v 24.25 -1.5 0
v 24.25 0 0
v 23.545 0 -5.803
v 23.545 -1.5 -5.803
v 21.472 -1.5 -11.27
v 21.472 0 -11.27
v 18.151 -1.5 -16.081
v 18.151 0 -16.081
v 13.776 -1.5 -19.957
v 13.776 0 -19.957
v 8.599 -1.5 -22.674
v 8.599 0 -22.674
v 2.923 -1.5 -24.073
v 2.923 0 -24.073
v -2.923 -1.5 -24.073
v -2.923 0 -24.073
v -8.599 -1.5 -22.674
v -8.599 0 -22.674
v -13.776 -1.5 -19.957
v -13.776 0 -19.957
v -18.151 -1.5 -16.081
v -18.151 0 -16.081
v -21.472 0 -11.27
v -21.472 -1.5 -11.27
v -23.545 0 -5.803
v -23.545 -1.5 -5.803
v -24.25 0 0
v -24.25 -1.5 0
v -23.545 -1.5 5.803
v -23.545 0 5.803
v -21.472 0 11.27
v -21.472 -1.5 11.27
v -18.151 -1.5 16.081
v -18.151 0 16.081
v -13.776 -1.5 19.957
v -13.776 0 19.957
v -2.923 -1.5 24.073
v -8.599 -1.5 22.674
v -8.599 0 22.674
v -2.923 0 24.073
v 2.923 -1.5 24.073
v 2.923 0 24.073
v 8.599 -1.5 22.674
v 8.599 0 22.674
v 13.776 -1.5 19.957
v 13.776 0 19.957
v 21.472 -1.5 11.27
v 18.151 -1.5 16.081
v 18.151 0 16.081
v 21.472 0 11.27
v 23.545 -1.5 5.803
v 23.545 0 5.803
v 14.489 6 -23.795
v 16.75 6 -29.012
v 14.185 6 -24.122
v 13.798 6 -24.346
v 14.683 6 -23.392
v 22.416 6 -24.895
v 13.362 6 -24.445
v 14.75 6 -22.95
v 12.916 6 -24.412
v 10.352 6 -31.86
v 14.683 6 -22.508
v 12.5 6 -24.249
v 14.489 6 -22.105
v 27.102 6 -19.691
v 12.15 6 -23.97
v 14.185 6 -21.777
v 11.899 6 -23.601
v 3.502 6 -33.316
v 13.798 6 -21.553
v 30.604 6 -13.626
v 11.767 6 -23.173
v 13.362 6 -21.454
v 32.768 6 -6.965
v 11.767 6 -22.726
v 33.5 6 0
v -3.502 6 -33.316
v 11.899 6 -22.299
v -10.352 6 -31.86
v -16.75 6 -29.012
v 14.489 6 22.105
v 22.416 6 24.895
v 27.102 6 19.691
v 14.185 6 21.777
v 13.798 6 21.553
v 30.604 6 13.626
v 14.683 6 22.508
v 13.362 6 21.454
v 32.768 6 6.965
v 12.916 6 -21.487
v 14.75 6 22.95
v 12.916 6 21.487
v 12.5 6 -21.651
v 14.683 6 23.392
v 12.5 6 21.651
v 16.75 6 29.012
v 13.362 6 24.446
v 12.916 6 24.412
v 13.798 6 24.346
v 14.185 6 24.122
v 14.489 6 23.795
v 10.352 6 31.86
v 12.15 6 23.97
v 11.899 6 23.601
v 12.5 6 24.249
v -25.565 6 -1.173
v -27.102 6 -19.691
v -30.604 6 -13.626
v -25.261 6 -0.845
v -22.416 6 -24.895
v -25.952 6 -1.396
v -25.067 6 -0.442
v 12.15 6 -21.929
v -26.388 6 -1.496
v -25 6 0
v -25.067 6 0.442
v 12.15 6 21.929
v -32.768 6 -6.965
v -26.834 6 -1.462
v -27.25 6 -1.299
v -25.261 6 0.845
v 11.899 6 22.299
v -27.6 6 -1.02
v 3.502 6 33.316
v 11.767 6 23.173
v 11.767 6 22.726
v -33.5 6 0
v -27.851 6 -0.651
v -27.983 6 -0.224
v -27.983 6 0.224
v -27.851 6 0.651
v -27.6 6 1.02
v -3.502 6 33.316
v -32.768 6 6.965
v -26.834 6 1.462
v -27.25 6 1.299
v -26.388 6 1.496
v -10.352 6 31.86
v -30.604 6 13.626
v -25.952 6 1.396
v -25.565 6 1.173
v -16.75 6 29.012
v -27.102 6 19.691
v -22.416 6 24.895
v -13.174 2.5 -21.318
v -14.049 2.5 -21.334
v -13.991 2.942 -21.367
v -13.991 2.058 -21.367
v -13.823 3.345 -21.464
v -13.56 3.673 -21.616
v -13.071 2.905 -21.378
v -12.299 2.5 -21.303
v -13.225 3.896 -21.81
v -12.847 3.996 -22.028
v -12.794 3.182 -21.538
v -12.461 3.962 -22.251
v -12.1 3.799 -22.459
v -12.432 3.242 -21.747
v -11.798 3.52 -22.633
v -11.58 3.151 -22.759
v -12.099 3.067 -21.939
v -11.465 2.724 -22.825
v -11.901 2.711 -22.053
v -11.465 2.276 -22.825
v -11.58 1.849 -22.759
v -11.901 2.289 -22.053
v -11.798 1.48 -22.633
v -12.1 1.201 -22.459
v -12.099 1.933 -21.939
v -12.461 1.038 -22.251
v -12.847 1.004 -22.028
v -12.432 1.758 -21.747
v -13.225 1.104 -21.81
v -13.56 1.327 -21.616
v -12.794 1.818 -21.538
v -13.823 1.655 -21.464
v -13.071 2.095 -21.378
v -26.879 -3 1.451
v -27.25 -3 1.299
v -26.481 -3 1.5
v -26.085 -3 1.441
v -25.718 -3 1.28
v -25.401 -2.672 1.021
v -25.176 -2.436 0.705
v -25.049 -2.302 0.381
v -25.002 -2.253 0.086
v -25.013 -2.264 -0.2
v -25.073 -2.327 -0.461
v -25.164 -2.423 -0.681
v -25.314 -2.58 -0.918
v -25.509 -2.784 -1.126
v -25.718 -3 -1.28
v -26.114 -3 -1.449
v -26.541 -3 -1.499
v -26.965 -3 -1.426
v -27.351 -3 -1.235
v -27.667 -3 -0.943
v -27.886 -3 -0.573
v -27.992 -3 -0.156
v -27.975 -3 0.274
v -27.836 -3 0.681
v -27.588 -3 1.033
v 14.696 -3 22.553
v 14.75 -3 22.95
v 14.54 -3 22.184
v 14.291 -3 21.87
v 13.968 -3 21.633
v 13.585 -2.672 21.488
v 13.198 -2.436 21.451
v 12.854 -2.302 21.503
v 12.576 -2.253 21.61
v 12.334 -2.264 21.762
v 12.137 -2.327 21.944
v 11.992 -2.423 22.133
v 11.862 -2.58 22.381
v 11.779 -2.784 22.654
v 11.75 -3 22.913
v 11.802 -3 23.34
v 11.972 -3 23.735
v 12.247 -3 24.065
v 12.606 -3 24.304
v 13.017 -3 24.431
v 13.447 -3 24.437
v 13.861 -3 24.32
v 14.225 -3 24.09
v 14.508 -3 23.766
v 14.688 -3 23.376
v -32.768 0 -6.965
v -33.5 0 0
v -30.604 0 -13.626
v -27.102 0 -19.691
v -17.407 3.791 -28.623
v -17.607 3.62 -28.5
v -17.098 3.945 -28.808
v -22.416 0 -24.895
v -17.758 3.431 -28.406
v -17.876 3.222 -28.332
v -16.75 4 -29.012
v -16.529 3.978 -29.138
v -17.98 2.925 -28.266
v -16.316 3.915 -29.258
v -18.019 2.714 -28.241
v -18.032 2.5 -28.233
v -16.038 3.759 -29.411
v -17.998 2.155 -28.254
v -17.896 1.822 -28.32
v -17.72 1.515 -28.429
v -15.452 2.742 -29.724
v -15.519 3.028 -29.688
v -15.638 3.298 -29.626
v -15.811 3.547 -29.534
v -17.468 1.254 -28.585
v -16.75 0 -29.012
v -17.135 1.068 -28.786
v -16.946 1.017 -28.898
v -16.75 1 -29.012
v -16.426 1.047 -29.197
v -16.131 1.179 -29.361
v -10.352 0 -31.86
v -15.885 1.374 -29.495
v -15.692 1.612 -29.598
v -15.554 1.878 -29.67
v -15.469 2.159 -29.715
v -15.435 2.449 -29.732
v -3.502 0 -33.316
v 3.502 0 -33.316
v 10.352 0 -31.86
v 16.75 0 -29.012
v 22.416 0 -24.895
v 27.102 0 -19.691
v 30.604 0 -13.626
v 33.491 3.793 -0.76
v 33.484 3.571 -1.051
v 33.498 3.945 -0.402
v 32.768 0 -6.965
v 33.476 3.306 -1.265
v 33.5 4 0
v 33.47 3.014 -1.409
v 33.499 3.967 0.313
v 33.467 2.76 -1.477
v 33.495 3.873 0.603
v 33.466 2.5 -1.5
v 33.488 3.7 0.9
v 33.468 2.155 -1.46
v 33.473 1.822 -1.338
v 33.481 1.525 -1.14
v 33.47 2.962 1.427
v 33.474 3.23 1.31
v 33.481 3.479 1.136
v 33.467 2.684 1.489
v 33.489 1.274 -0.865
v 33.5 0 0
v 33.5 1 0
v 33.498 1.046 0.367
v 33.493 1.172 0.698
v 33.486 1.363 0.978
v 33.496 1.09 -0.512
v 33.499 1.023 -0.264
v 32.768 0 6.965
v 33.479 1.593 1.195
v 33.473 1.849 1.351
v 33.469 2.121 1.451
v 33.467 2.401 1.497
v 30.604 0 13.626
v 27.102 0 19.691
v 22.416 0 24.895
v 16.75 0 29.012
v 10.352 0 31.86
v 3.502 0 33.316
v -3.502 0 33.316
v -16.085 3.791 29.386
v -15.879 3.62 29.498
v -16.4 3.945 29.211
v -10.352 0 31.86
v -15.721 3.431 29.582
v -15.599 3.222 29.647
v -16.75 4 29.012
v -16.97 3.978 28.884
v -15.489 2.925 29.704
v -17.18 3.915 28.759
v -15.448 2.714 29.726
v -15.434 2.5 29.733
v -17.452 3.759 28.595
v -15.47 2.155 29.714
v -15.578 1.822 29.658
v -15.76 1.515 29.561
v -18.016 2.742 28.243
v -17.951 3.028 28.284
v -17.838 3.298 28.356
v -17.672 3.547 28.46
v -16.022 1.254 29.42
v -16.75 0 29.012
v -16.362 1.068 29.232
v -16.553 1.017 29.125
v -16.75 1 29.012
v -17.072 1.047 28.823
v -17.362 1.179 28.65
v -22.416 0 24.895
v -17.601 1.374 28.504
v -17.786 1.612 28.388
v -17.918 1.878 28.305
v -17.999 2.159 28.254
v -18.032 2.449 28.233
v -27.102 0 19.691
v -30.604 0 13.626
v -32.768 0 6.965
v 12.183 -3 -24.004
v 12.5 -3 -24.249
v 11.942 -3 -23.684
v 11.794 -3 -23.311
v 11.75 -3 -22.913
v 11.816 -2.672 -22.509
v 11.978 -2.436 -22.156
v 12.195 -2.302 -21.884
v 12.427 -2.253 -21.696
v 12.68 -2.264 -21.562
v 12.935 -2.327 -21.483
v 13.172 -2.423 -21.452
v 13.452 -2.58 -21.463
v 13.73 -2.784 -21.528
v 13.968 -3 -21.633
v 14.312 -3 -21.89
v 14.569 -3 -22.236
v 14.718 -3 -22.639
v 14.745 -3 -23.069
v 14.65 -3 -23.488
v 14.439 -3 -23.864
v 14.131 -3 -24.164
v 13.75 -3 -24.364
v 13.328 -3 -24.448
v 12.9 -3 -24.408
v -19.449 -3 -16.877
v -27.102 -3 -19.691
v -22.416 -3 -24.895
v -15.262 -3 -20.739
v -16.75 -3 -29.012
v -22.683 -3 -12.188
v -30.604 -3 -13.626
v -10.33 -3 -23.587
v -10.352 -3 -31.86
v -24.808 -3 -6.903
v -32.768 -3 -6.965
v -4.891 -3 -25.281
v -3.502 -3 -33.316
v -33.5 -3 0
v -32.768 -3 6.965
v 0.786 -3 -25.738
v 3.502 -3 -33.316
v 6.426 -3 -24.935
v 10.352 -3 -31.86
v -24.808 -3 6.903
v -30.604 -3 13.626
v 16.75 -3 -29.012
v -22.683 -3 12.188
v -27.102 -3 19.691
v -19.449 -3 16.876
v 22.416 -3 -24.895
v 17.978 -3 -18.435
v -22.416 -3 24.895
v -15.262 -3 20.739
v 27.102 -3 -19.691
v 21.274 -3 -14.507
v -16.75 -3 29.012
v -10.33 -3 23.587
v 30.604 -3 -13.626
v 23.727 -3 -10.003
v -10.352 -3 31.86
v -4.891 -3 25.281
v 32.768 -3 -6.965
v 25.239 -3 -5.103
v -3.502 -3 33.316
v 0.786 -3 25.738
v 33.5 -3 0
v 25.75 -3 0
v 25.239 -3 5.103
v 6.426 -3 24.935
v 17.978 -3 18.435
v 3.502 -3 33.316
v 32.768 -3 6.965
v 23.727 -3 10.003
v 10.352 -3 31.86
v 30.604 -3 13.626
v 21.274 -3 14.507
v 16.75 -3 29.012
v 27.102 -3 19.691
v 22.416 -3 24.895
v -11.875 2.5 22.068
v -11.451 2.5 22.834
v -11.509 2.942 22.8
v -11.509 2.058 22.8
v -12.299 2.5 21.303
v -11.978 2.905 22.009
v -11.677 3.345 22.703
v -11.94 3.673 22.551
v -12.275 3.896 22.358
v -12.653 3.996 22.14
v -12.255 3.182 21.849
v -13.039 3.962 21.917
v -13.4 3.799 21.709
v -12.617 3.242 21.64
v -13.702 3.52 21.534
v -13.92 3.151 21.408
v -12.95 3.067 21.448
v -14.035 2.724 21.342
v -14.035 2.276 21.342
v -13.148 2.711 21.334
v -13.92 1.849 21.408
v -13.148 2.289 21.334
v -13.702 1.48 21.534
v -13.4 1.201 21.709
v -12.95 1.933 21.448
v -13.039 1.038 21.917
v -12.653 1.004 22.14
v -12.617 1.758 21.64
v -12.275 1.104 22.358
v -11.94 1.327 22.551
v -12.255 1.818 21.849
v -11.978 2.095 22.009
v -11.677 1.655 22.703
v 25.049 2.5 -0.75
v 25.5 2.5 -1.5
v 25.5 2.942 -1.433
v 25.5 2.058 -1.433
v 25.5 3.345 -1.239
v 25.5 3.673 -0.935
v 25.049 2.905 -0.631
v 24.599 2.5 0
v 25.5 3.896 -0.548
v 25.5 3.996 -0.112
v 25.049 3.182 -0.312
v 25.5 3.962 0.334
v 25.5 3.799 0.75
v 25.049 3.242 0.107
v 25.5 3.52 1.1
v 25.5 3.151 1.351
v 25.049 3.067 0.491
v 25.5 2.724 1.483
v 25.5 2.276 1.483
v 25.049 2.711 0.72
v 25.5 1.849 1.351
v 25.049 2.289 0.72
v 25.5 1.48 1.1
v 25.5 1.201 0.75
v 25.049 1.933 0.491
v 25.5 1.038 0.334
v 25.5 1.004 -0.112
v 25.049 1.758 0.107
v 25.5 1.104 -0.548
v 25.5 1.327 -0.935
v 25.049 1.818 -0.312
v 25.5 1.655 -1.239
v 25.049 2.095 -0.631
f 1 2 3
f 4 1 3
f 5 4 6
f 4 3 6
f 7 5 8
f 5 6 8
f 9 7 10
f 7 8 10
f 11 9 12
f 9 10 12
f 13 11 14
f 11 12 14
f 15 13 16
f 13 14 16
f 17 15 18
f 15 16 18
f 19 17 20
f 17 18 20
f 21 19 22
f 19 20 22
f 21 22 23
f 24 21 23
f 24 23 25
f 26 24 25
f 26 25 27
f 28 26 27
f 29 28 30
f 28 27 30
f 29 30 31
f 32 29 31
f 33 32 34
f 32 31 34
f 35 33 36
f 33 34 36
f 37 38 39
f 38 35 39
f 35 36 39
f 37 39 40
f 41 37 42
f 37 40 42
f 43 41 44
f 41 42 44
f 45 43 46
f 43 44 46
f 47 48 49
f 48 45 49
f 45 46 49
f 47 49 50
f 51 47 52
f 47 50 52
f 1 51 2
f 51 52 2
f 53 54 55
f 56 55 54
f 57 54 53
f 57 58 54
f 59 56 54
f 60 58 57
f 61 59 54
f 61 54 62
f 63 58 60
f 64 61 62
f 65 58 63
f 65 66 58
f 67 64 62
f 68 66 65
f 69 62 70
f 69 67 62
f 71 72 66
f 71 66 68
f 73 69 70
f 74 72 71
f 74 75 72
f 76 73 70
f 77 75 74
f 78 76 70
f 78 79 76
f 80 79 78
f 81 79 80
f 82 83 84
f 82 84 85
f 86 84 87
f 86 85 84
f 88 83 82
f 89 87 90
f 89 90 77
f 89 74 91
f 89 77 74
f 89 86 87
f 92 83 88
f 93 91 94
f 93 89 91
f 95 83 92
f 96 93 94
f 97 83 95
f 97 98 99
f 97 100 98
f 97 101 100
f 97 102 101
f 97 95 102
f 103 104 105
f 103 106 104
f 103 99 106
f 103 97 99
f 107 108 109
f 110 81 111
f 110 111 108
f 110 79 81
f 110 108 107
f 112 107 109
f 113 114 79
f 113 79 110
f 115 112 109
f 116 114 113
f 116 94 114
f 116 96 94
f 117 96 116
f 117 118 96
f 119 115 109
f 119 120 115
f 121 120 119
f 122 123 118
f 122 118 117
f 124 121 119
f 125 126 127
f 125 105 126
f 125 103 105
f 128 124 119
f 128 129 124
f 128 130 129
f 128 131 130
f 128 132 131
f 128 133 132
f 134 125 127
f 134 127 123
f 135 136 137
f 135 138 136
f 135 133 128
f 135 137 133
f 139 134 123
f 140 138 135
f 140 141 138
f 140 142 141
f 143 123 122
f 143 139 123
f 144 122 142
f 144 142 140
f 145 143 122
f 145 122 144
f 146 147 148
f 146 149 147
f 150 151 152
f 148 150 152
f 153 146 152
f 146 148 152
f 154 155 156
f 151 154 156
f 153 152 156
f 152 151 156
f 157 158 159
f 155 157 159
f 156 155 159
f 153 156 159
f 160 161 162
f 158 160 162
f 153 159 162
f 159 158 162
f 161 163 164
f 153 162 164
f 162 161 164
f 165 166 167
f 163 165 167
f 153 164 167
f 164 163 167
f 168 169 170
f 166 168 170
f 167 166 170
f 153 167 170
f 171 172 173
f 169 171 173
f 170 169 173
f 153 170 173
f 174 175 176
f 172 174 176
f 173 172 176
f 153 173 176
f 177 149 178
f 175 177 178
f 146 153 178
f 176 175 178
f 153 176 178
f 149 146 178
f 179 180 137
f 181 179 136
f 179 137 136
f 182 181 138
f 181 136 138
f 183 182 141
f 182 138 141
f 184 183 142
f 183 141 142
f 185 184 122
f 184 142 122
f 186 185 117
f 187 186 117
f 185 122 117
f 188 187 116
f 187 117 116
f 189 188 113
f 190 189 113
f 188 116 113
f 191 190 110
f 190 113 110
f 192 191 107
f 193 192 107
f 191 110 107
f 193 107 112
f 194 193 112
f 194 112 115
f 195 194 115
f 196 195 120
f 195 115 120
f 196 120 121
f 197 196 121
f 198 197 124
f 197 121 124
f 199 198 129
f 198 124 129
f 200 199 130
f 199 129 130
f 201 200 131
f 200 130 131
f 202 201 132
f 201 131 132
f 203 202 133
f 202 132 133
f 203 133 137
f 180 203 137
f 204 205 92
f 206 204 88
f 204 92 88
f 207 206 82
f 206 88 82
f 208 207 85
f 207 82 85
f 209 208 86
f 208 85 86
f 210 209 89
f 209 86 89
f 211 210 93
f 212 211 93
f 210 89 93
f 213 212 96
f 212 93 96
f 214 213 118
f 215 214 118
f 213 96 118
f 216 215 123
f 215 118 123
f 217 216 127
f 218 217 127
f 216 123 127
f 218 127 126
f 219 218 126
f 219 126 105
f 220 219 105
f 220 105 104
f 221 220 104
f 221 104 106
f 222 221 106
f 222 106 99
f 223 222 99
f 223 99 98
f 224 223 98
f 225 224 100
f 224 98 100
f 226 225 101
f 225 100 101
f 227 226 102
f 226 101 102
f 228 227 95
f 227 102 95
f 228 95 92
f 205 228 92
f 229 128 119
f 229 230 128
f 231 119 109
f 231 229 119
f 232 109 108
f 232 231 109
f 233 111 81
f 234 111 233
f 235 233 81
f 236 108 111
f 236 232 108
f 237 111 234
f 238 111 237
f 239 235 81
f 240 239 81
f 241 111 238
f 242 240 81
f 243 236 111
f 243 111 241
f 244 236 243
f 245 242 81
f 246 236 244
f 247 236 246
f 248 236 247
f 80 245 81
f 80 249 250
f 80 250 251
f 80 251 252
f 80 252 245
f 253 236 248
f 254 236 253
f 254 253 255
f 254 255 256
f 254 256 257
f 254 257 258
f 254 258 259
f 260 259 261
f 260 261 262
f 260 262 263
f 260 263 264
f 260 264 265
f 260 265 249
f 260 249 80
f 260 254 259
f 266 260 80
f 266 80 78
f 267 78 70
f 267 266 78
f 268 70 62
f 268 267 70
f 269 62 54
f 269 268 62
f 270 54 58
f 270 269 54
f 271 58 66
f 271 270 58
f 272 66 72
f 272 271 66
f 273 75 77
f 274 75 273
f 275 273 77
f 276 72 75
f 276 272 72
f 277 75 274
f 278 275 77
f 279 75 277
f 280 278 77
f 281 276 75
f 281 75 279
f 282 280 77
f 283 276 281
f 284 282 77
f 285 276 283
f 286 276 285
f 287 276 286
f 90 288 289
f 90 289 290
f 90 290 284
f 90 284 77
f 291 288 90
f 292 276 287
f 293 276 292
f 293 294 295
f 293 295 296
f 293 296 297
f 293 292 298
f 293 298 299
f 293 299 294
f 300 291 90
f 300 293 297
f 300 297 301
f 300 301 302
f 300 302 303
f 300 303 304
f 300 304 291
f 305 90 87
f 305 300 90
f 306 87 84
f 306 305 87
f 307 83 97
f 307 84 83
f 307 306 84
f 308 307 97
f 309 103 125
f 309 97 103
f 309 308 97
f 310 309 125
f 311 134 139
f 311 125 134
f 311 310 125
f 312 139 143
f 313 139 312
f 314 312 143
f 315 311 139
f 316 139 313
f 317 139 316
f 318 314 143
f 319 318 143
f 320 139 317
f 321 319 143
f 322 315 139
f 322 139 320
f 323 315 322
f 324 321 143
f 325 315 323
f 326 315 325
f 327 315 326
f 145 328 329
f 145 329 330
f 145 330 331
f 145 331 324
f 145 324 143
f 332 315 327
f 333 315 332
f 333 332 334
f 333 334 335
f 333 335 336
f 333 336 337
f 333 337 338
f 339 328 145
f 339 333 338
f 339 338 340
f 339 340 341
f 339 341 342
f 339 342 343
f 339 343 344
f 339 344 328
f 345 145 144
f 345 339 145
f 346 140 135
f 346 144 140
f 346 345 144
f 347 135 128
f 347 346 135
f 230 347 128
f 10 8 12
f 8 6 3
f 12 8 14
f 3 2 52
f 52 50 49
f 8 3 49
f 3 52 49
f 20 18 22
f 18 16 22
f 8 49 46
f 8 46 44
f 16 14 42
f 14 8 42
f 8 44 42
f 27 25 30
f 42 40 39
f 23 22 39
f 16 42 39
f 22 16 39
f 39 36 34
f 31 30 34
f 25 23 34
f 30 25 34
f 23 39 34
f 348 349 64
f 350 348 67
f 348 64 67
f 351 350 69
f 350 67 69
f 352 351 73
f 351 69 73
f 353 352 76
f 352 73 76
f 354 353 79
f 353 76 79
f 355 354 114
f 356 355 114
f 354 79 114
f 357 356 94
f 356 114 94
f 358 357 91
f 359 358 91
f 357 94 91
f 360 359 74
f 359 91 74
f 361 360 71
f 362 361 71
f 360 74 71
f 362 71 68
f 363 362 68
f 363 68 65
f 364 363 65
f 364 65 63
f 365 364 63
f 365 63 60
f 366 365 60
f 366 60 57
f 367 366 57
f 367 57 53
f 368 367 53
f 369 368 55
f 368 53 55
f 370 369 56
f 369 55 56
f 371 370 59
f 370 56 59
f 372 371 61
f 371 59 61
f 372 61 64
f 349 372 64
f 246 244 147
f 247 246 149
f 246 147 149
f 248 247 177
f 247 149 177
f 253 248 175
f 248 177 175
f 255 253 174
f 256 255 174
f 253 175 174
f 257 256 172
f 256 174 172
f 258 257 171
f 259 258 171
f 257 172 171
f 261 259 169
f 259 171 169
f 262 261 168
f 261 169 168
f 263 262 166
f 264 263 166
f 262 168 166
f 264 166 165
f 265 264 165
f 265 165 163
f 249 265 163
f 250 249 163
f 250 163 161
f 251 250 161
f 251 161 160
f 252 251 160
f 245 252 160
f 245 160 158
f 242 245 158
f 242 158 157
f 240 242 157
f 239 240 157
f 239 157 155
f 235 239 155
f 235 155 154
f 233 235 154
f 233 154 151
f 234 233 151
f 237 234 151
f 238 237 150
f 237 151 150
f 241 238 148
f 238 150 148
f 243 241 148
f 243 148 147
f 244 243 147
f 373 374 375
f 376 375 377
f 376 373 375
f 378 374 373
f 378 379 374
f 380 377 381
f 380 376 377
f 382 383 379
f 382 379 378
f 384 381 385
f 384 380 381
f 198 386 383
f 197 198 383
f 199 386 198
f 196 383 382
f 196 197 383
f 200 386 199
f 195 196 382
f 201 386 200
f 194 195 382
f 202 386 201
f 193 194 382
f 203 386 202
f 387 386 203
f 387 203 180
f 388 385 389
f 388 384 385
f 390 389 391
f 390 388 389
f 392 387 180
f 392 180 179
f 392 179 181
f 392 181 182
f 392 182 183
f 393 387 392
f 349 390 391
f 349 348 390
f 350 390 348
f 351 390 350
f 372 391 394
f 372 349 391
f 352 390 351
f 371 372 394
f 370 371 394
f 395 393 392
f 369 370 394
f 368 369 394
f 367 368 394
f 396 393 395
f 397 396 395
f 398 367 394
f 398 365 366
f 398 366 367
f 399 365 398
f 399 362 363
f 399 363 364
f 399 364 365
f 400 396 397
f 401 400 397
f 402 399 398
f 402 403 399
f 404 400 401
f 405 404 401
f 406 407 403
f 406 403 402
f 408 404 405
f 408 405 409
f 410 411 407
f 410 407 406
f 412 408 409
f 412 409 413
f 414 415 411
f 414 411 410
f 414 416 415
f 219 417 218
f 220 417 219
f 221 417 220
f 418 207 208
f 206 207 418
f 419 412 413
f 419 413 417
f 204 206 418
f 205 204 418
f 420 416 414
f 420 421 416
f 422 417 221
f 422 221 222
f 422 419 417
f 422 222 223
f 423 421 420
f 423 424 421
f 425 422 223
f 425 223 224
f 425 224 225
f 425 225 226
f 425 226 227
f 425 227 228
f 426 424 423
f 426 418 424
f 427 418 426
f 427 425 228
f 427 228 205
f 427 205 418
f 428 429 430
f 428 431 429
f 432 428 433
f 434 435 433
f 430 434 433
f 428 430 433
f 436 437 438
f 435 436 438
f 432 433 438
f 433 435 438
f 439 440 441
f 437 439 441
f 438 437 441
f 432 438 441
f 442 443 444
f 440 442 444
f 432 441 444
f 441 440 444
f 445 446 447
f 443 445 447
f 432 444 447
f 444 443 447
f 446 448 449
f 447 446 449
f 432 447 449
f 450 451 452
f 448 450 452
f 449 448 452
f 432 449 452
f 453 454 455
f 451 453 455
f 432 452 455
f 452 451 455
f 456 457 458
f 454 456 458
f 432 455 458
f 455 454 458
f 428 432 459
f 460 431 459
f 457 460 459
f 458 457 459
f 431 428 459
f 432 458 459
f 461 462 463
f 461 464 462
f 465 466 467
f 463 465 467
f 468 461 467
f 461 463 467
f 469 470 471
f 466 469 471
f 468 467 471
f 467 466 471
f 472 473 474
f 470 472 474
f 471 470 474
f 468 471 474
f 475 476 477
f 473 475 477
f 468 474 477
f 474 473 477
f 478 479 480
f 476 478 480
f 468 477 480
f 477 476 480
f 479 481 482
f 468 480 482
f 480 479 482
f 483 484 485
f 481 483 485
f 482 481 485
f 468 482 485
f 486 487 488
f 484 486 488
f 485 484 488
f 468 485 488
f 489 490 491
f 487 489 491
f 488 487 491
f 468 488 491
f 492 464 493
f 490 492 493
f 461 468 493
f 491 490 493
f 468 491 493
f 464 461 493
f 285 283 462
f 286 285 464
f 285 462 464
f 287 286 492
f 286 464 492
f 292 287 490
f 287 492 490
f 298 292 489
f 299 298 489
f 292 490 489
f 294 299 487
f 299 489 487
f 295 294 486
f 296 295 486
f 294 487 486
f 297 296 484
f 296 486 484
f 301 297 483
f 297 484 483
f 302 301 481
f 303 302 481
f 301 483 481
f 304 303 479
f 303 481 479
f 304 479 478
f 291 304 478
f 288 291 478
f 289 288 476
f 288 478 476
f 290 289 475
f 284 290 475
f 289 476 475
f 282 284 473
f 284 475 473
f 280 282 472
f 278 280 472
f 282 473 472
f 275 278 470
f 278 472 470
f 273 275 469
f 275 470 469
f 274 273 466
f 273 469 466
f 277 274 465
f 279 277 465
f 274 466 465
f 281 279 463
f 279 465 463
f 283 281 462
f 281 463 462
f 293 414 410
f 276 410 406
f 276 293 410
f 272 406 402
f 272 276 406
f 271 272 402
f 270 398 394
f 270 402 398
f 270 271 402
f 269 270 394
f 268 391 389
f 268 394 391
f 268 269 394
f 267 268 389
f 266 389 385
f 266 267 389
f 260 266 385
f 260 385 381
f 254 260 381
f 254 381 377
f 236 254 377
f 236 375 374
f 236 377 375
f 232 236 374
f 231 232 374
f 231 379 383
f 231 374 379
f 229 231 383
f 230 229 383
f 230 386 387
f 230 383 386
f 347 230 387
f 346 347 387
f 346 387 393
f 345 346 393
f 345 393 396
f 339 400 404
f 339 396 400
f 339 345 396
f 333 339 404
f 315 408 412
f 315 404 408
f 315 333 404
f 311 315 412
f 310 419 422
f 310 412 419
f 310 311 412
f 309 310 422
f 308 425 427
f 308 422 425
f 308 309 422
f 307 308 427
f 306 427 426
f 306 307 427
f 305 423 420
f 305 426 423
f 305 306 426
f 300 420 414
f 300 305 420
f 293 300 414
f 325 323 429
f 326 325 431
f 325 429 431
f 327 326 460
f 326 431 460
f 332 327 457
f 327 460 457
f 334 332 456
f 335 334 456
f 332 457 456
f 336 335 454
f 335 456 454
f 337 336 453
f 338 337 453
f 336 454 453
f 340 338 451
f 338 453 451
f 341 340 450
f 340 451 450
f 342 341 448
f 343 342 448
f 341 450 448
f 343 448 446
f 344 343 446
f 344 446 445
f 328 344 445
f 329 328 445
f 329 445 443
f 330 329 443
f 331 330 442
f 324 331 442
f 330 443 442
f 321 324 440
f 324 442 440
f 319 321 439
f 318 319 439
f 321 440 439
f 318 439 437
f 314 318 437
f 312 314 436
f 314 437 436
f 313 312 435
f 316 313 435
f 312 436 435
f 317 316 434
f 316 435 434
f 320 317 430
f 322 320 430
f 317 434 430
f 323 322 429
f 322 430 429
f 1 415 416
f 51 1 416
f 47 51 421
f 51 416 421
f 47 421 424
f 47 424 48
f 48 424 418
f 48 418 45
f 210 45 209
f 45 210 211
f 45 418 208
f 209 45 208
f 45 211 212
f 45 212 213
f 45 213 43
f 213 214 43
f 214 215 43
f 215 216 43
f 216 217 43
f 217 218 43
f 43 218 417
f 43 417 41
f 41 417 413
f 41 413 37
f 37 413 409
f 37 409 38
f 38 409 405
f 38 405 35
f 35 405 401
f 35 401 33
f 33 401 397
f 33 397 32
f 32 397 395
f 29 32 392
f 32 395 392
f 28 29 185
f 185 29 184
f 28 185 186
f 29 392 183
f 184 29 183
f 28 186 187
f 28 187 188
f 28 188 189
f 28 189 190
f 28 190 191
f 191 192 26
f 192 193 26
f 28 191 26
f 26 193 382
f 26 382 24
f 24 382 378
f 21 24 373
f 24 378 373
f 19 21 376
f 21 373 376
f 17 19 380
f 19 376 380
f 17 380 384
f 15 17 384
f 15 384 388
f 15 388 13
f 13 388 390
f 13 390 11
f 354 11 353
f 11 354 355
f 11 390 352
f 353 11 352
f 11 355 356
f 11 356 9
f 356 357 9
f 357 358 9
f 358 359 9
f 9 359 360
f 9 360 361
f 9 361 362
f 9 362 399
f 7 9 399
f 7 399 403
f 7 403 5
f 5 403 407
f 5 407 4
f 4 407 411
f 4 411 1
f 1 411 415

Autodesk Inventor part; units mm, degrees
ref_plane "XZ Plane" through (0, 0, 0) normal (0, 1, 0) x (-1, 0, 0)
ref_plane "XY Plane" through (0, 0, 0) normal (0, 0, 1) x (1, 0, 0)
sketch "Sketch1" plane through (0, 0, 0) normal (0, 1, 0) x (-1, 0, 0)
  circle A0 centre (0, 0) radius 33.5
  dimension "d0" = 67
extrude "Extrusion1" add sketch "Sketch1" along normal blind 6
ref_plane "Work Plane1" through (33.5, 0, 0) normal (1, 0, 0) x (0, 1, 0)
sketch "Sketch6" plane through (33.5, 0, 0) normal (1, 0, 0) x (0, 1, 0)
  line L0 (0, -33.5) -> (0, 33.5) projected
  point P0 (0, 0)
  point P1 (2.5, 0)
  dimension "d47" = 2.5
hole "Hole4" at (33.5, 2.5, 0) direction (-1, 0, 0) diameter 3 depth 8 tip angle 118
pattern_circular "Circular Pattern3" count 3 over 360 about axis through (0, 0, 0) along (0, 1, 0) of "Hole4"
sketch "Sketch7" plane through (0, 0, 0) normal (0, -1, 0) x (1, 0, 0)
  circle A0 centre (0, 0) radius 24.25
  circle A1 centre (0, 0) radius 33.5
  dimension "d58" = 48.5
  dimension "d59" = 67
extrude "Extrusion3" add sketch "Sketch7" along normal blind 3
chamfer "Chamfer1" distance 1.5 angle 45 1 edges at (-24.25, -3, 0)
sketch "Sketch8" plane through (0, 6, 0) normal (0, 1, 0) x (1, 0, 0)
  circle A0 centre (13.25, -22.9497) radius 1.5
  circle A1 centre (0, 0) radius 33.5 construction
  line L0 (0, 0) -> (13.25, -22.9497) construction
  line L1 (0, 0) -> (33.5, 0) construction
  dimension "d65" = 3
  dimension "d66" = 26.5
  dimension "d67" = 60
extrude "Extrusion4" cut sketch "Sketch8" against normal blind 10
pattern_circular "Circular Pattern4" count 3 over 360 about axis through (0, 0, 0) along (0, 1, 0) of "Extrusion4"
properties part number "Engine bulkhead" material "Steel AISI 1006 85 HR"
